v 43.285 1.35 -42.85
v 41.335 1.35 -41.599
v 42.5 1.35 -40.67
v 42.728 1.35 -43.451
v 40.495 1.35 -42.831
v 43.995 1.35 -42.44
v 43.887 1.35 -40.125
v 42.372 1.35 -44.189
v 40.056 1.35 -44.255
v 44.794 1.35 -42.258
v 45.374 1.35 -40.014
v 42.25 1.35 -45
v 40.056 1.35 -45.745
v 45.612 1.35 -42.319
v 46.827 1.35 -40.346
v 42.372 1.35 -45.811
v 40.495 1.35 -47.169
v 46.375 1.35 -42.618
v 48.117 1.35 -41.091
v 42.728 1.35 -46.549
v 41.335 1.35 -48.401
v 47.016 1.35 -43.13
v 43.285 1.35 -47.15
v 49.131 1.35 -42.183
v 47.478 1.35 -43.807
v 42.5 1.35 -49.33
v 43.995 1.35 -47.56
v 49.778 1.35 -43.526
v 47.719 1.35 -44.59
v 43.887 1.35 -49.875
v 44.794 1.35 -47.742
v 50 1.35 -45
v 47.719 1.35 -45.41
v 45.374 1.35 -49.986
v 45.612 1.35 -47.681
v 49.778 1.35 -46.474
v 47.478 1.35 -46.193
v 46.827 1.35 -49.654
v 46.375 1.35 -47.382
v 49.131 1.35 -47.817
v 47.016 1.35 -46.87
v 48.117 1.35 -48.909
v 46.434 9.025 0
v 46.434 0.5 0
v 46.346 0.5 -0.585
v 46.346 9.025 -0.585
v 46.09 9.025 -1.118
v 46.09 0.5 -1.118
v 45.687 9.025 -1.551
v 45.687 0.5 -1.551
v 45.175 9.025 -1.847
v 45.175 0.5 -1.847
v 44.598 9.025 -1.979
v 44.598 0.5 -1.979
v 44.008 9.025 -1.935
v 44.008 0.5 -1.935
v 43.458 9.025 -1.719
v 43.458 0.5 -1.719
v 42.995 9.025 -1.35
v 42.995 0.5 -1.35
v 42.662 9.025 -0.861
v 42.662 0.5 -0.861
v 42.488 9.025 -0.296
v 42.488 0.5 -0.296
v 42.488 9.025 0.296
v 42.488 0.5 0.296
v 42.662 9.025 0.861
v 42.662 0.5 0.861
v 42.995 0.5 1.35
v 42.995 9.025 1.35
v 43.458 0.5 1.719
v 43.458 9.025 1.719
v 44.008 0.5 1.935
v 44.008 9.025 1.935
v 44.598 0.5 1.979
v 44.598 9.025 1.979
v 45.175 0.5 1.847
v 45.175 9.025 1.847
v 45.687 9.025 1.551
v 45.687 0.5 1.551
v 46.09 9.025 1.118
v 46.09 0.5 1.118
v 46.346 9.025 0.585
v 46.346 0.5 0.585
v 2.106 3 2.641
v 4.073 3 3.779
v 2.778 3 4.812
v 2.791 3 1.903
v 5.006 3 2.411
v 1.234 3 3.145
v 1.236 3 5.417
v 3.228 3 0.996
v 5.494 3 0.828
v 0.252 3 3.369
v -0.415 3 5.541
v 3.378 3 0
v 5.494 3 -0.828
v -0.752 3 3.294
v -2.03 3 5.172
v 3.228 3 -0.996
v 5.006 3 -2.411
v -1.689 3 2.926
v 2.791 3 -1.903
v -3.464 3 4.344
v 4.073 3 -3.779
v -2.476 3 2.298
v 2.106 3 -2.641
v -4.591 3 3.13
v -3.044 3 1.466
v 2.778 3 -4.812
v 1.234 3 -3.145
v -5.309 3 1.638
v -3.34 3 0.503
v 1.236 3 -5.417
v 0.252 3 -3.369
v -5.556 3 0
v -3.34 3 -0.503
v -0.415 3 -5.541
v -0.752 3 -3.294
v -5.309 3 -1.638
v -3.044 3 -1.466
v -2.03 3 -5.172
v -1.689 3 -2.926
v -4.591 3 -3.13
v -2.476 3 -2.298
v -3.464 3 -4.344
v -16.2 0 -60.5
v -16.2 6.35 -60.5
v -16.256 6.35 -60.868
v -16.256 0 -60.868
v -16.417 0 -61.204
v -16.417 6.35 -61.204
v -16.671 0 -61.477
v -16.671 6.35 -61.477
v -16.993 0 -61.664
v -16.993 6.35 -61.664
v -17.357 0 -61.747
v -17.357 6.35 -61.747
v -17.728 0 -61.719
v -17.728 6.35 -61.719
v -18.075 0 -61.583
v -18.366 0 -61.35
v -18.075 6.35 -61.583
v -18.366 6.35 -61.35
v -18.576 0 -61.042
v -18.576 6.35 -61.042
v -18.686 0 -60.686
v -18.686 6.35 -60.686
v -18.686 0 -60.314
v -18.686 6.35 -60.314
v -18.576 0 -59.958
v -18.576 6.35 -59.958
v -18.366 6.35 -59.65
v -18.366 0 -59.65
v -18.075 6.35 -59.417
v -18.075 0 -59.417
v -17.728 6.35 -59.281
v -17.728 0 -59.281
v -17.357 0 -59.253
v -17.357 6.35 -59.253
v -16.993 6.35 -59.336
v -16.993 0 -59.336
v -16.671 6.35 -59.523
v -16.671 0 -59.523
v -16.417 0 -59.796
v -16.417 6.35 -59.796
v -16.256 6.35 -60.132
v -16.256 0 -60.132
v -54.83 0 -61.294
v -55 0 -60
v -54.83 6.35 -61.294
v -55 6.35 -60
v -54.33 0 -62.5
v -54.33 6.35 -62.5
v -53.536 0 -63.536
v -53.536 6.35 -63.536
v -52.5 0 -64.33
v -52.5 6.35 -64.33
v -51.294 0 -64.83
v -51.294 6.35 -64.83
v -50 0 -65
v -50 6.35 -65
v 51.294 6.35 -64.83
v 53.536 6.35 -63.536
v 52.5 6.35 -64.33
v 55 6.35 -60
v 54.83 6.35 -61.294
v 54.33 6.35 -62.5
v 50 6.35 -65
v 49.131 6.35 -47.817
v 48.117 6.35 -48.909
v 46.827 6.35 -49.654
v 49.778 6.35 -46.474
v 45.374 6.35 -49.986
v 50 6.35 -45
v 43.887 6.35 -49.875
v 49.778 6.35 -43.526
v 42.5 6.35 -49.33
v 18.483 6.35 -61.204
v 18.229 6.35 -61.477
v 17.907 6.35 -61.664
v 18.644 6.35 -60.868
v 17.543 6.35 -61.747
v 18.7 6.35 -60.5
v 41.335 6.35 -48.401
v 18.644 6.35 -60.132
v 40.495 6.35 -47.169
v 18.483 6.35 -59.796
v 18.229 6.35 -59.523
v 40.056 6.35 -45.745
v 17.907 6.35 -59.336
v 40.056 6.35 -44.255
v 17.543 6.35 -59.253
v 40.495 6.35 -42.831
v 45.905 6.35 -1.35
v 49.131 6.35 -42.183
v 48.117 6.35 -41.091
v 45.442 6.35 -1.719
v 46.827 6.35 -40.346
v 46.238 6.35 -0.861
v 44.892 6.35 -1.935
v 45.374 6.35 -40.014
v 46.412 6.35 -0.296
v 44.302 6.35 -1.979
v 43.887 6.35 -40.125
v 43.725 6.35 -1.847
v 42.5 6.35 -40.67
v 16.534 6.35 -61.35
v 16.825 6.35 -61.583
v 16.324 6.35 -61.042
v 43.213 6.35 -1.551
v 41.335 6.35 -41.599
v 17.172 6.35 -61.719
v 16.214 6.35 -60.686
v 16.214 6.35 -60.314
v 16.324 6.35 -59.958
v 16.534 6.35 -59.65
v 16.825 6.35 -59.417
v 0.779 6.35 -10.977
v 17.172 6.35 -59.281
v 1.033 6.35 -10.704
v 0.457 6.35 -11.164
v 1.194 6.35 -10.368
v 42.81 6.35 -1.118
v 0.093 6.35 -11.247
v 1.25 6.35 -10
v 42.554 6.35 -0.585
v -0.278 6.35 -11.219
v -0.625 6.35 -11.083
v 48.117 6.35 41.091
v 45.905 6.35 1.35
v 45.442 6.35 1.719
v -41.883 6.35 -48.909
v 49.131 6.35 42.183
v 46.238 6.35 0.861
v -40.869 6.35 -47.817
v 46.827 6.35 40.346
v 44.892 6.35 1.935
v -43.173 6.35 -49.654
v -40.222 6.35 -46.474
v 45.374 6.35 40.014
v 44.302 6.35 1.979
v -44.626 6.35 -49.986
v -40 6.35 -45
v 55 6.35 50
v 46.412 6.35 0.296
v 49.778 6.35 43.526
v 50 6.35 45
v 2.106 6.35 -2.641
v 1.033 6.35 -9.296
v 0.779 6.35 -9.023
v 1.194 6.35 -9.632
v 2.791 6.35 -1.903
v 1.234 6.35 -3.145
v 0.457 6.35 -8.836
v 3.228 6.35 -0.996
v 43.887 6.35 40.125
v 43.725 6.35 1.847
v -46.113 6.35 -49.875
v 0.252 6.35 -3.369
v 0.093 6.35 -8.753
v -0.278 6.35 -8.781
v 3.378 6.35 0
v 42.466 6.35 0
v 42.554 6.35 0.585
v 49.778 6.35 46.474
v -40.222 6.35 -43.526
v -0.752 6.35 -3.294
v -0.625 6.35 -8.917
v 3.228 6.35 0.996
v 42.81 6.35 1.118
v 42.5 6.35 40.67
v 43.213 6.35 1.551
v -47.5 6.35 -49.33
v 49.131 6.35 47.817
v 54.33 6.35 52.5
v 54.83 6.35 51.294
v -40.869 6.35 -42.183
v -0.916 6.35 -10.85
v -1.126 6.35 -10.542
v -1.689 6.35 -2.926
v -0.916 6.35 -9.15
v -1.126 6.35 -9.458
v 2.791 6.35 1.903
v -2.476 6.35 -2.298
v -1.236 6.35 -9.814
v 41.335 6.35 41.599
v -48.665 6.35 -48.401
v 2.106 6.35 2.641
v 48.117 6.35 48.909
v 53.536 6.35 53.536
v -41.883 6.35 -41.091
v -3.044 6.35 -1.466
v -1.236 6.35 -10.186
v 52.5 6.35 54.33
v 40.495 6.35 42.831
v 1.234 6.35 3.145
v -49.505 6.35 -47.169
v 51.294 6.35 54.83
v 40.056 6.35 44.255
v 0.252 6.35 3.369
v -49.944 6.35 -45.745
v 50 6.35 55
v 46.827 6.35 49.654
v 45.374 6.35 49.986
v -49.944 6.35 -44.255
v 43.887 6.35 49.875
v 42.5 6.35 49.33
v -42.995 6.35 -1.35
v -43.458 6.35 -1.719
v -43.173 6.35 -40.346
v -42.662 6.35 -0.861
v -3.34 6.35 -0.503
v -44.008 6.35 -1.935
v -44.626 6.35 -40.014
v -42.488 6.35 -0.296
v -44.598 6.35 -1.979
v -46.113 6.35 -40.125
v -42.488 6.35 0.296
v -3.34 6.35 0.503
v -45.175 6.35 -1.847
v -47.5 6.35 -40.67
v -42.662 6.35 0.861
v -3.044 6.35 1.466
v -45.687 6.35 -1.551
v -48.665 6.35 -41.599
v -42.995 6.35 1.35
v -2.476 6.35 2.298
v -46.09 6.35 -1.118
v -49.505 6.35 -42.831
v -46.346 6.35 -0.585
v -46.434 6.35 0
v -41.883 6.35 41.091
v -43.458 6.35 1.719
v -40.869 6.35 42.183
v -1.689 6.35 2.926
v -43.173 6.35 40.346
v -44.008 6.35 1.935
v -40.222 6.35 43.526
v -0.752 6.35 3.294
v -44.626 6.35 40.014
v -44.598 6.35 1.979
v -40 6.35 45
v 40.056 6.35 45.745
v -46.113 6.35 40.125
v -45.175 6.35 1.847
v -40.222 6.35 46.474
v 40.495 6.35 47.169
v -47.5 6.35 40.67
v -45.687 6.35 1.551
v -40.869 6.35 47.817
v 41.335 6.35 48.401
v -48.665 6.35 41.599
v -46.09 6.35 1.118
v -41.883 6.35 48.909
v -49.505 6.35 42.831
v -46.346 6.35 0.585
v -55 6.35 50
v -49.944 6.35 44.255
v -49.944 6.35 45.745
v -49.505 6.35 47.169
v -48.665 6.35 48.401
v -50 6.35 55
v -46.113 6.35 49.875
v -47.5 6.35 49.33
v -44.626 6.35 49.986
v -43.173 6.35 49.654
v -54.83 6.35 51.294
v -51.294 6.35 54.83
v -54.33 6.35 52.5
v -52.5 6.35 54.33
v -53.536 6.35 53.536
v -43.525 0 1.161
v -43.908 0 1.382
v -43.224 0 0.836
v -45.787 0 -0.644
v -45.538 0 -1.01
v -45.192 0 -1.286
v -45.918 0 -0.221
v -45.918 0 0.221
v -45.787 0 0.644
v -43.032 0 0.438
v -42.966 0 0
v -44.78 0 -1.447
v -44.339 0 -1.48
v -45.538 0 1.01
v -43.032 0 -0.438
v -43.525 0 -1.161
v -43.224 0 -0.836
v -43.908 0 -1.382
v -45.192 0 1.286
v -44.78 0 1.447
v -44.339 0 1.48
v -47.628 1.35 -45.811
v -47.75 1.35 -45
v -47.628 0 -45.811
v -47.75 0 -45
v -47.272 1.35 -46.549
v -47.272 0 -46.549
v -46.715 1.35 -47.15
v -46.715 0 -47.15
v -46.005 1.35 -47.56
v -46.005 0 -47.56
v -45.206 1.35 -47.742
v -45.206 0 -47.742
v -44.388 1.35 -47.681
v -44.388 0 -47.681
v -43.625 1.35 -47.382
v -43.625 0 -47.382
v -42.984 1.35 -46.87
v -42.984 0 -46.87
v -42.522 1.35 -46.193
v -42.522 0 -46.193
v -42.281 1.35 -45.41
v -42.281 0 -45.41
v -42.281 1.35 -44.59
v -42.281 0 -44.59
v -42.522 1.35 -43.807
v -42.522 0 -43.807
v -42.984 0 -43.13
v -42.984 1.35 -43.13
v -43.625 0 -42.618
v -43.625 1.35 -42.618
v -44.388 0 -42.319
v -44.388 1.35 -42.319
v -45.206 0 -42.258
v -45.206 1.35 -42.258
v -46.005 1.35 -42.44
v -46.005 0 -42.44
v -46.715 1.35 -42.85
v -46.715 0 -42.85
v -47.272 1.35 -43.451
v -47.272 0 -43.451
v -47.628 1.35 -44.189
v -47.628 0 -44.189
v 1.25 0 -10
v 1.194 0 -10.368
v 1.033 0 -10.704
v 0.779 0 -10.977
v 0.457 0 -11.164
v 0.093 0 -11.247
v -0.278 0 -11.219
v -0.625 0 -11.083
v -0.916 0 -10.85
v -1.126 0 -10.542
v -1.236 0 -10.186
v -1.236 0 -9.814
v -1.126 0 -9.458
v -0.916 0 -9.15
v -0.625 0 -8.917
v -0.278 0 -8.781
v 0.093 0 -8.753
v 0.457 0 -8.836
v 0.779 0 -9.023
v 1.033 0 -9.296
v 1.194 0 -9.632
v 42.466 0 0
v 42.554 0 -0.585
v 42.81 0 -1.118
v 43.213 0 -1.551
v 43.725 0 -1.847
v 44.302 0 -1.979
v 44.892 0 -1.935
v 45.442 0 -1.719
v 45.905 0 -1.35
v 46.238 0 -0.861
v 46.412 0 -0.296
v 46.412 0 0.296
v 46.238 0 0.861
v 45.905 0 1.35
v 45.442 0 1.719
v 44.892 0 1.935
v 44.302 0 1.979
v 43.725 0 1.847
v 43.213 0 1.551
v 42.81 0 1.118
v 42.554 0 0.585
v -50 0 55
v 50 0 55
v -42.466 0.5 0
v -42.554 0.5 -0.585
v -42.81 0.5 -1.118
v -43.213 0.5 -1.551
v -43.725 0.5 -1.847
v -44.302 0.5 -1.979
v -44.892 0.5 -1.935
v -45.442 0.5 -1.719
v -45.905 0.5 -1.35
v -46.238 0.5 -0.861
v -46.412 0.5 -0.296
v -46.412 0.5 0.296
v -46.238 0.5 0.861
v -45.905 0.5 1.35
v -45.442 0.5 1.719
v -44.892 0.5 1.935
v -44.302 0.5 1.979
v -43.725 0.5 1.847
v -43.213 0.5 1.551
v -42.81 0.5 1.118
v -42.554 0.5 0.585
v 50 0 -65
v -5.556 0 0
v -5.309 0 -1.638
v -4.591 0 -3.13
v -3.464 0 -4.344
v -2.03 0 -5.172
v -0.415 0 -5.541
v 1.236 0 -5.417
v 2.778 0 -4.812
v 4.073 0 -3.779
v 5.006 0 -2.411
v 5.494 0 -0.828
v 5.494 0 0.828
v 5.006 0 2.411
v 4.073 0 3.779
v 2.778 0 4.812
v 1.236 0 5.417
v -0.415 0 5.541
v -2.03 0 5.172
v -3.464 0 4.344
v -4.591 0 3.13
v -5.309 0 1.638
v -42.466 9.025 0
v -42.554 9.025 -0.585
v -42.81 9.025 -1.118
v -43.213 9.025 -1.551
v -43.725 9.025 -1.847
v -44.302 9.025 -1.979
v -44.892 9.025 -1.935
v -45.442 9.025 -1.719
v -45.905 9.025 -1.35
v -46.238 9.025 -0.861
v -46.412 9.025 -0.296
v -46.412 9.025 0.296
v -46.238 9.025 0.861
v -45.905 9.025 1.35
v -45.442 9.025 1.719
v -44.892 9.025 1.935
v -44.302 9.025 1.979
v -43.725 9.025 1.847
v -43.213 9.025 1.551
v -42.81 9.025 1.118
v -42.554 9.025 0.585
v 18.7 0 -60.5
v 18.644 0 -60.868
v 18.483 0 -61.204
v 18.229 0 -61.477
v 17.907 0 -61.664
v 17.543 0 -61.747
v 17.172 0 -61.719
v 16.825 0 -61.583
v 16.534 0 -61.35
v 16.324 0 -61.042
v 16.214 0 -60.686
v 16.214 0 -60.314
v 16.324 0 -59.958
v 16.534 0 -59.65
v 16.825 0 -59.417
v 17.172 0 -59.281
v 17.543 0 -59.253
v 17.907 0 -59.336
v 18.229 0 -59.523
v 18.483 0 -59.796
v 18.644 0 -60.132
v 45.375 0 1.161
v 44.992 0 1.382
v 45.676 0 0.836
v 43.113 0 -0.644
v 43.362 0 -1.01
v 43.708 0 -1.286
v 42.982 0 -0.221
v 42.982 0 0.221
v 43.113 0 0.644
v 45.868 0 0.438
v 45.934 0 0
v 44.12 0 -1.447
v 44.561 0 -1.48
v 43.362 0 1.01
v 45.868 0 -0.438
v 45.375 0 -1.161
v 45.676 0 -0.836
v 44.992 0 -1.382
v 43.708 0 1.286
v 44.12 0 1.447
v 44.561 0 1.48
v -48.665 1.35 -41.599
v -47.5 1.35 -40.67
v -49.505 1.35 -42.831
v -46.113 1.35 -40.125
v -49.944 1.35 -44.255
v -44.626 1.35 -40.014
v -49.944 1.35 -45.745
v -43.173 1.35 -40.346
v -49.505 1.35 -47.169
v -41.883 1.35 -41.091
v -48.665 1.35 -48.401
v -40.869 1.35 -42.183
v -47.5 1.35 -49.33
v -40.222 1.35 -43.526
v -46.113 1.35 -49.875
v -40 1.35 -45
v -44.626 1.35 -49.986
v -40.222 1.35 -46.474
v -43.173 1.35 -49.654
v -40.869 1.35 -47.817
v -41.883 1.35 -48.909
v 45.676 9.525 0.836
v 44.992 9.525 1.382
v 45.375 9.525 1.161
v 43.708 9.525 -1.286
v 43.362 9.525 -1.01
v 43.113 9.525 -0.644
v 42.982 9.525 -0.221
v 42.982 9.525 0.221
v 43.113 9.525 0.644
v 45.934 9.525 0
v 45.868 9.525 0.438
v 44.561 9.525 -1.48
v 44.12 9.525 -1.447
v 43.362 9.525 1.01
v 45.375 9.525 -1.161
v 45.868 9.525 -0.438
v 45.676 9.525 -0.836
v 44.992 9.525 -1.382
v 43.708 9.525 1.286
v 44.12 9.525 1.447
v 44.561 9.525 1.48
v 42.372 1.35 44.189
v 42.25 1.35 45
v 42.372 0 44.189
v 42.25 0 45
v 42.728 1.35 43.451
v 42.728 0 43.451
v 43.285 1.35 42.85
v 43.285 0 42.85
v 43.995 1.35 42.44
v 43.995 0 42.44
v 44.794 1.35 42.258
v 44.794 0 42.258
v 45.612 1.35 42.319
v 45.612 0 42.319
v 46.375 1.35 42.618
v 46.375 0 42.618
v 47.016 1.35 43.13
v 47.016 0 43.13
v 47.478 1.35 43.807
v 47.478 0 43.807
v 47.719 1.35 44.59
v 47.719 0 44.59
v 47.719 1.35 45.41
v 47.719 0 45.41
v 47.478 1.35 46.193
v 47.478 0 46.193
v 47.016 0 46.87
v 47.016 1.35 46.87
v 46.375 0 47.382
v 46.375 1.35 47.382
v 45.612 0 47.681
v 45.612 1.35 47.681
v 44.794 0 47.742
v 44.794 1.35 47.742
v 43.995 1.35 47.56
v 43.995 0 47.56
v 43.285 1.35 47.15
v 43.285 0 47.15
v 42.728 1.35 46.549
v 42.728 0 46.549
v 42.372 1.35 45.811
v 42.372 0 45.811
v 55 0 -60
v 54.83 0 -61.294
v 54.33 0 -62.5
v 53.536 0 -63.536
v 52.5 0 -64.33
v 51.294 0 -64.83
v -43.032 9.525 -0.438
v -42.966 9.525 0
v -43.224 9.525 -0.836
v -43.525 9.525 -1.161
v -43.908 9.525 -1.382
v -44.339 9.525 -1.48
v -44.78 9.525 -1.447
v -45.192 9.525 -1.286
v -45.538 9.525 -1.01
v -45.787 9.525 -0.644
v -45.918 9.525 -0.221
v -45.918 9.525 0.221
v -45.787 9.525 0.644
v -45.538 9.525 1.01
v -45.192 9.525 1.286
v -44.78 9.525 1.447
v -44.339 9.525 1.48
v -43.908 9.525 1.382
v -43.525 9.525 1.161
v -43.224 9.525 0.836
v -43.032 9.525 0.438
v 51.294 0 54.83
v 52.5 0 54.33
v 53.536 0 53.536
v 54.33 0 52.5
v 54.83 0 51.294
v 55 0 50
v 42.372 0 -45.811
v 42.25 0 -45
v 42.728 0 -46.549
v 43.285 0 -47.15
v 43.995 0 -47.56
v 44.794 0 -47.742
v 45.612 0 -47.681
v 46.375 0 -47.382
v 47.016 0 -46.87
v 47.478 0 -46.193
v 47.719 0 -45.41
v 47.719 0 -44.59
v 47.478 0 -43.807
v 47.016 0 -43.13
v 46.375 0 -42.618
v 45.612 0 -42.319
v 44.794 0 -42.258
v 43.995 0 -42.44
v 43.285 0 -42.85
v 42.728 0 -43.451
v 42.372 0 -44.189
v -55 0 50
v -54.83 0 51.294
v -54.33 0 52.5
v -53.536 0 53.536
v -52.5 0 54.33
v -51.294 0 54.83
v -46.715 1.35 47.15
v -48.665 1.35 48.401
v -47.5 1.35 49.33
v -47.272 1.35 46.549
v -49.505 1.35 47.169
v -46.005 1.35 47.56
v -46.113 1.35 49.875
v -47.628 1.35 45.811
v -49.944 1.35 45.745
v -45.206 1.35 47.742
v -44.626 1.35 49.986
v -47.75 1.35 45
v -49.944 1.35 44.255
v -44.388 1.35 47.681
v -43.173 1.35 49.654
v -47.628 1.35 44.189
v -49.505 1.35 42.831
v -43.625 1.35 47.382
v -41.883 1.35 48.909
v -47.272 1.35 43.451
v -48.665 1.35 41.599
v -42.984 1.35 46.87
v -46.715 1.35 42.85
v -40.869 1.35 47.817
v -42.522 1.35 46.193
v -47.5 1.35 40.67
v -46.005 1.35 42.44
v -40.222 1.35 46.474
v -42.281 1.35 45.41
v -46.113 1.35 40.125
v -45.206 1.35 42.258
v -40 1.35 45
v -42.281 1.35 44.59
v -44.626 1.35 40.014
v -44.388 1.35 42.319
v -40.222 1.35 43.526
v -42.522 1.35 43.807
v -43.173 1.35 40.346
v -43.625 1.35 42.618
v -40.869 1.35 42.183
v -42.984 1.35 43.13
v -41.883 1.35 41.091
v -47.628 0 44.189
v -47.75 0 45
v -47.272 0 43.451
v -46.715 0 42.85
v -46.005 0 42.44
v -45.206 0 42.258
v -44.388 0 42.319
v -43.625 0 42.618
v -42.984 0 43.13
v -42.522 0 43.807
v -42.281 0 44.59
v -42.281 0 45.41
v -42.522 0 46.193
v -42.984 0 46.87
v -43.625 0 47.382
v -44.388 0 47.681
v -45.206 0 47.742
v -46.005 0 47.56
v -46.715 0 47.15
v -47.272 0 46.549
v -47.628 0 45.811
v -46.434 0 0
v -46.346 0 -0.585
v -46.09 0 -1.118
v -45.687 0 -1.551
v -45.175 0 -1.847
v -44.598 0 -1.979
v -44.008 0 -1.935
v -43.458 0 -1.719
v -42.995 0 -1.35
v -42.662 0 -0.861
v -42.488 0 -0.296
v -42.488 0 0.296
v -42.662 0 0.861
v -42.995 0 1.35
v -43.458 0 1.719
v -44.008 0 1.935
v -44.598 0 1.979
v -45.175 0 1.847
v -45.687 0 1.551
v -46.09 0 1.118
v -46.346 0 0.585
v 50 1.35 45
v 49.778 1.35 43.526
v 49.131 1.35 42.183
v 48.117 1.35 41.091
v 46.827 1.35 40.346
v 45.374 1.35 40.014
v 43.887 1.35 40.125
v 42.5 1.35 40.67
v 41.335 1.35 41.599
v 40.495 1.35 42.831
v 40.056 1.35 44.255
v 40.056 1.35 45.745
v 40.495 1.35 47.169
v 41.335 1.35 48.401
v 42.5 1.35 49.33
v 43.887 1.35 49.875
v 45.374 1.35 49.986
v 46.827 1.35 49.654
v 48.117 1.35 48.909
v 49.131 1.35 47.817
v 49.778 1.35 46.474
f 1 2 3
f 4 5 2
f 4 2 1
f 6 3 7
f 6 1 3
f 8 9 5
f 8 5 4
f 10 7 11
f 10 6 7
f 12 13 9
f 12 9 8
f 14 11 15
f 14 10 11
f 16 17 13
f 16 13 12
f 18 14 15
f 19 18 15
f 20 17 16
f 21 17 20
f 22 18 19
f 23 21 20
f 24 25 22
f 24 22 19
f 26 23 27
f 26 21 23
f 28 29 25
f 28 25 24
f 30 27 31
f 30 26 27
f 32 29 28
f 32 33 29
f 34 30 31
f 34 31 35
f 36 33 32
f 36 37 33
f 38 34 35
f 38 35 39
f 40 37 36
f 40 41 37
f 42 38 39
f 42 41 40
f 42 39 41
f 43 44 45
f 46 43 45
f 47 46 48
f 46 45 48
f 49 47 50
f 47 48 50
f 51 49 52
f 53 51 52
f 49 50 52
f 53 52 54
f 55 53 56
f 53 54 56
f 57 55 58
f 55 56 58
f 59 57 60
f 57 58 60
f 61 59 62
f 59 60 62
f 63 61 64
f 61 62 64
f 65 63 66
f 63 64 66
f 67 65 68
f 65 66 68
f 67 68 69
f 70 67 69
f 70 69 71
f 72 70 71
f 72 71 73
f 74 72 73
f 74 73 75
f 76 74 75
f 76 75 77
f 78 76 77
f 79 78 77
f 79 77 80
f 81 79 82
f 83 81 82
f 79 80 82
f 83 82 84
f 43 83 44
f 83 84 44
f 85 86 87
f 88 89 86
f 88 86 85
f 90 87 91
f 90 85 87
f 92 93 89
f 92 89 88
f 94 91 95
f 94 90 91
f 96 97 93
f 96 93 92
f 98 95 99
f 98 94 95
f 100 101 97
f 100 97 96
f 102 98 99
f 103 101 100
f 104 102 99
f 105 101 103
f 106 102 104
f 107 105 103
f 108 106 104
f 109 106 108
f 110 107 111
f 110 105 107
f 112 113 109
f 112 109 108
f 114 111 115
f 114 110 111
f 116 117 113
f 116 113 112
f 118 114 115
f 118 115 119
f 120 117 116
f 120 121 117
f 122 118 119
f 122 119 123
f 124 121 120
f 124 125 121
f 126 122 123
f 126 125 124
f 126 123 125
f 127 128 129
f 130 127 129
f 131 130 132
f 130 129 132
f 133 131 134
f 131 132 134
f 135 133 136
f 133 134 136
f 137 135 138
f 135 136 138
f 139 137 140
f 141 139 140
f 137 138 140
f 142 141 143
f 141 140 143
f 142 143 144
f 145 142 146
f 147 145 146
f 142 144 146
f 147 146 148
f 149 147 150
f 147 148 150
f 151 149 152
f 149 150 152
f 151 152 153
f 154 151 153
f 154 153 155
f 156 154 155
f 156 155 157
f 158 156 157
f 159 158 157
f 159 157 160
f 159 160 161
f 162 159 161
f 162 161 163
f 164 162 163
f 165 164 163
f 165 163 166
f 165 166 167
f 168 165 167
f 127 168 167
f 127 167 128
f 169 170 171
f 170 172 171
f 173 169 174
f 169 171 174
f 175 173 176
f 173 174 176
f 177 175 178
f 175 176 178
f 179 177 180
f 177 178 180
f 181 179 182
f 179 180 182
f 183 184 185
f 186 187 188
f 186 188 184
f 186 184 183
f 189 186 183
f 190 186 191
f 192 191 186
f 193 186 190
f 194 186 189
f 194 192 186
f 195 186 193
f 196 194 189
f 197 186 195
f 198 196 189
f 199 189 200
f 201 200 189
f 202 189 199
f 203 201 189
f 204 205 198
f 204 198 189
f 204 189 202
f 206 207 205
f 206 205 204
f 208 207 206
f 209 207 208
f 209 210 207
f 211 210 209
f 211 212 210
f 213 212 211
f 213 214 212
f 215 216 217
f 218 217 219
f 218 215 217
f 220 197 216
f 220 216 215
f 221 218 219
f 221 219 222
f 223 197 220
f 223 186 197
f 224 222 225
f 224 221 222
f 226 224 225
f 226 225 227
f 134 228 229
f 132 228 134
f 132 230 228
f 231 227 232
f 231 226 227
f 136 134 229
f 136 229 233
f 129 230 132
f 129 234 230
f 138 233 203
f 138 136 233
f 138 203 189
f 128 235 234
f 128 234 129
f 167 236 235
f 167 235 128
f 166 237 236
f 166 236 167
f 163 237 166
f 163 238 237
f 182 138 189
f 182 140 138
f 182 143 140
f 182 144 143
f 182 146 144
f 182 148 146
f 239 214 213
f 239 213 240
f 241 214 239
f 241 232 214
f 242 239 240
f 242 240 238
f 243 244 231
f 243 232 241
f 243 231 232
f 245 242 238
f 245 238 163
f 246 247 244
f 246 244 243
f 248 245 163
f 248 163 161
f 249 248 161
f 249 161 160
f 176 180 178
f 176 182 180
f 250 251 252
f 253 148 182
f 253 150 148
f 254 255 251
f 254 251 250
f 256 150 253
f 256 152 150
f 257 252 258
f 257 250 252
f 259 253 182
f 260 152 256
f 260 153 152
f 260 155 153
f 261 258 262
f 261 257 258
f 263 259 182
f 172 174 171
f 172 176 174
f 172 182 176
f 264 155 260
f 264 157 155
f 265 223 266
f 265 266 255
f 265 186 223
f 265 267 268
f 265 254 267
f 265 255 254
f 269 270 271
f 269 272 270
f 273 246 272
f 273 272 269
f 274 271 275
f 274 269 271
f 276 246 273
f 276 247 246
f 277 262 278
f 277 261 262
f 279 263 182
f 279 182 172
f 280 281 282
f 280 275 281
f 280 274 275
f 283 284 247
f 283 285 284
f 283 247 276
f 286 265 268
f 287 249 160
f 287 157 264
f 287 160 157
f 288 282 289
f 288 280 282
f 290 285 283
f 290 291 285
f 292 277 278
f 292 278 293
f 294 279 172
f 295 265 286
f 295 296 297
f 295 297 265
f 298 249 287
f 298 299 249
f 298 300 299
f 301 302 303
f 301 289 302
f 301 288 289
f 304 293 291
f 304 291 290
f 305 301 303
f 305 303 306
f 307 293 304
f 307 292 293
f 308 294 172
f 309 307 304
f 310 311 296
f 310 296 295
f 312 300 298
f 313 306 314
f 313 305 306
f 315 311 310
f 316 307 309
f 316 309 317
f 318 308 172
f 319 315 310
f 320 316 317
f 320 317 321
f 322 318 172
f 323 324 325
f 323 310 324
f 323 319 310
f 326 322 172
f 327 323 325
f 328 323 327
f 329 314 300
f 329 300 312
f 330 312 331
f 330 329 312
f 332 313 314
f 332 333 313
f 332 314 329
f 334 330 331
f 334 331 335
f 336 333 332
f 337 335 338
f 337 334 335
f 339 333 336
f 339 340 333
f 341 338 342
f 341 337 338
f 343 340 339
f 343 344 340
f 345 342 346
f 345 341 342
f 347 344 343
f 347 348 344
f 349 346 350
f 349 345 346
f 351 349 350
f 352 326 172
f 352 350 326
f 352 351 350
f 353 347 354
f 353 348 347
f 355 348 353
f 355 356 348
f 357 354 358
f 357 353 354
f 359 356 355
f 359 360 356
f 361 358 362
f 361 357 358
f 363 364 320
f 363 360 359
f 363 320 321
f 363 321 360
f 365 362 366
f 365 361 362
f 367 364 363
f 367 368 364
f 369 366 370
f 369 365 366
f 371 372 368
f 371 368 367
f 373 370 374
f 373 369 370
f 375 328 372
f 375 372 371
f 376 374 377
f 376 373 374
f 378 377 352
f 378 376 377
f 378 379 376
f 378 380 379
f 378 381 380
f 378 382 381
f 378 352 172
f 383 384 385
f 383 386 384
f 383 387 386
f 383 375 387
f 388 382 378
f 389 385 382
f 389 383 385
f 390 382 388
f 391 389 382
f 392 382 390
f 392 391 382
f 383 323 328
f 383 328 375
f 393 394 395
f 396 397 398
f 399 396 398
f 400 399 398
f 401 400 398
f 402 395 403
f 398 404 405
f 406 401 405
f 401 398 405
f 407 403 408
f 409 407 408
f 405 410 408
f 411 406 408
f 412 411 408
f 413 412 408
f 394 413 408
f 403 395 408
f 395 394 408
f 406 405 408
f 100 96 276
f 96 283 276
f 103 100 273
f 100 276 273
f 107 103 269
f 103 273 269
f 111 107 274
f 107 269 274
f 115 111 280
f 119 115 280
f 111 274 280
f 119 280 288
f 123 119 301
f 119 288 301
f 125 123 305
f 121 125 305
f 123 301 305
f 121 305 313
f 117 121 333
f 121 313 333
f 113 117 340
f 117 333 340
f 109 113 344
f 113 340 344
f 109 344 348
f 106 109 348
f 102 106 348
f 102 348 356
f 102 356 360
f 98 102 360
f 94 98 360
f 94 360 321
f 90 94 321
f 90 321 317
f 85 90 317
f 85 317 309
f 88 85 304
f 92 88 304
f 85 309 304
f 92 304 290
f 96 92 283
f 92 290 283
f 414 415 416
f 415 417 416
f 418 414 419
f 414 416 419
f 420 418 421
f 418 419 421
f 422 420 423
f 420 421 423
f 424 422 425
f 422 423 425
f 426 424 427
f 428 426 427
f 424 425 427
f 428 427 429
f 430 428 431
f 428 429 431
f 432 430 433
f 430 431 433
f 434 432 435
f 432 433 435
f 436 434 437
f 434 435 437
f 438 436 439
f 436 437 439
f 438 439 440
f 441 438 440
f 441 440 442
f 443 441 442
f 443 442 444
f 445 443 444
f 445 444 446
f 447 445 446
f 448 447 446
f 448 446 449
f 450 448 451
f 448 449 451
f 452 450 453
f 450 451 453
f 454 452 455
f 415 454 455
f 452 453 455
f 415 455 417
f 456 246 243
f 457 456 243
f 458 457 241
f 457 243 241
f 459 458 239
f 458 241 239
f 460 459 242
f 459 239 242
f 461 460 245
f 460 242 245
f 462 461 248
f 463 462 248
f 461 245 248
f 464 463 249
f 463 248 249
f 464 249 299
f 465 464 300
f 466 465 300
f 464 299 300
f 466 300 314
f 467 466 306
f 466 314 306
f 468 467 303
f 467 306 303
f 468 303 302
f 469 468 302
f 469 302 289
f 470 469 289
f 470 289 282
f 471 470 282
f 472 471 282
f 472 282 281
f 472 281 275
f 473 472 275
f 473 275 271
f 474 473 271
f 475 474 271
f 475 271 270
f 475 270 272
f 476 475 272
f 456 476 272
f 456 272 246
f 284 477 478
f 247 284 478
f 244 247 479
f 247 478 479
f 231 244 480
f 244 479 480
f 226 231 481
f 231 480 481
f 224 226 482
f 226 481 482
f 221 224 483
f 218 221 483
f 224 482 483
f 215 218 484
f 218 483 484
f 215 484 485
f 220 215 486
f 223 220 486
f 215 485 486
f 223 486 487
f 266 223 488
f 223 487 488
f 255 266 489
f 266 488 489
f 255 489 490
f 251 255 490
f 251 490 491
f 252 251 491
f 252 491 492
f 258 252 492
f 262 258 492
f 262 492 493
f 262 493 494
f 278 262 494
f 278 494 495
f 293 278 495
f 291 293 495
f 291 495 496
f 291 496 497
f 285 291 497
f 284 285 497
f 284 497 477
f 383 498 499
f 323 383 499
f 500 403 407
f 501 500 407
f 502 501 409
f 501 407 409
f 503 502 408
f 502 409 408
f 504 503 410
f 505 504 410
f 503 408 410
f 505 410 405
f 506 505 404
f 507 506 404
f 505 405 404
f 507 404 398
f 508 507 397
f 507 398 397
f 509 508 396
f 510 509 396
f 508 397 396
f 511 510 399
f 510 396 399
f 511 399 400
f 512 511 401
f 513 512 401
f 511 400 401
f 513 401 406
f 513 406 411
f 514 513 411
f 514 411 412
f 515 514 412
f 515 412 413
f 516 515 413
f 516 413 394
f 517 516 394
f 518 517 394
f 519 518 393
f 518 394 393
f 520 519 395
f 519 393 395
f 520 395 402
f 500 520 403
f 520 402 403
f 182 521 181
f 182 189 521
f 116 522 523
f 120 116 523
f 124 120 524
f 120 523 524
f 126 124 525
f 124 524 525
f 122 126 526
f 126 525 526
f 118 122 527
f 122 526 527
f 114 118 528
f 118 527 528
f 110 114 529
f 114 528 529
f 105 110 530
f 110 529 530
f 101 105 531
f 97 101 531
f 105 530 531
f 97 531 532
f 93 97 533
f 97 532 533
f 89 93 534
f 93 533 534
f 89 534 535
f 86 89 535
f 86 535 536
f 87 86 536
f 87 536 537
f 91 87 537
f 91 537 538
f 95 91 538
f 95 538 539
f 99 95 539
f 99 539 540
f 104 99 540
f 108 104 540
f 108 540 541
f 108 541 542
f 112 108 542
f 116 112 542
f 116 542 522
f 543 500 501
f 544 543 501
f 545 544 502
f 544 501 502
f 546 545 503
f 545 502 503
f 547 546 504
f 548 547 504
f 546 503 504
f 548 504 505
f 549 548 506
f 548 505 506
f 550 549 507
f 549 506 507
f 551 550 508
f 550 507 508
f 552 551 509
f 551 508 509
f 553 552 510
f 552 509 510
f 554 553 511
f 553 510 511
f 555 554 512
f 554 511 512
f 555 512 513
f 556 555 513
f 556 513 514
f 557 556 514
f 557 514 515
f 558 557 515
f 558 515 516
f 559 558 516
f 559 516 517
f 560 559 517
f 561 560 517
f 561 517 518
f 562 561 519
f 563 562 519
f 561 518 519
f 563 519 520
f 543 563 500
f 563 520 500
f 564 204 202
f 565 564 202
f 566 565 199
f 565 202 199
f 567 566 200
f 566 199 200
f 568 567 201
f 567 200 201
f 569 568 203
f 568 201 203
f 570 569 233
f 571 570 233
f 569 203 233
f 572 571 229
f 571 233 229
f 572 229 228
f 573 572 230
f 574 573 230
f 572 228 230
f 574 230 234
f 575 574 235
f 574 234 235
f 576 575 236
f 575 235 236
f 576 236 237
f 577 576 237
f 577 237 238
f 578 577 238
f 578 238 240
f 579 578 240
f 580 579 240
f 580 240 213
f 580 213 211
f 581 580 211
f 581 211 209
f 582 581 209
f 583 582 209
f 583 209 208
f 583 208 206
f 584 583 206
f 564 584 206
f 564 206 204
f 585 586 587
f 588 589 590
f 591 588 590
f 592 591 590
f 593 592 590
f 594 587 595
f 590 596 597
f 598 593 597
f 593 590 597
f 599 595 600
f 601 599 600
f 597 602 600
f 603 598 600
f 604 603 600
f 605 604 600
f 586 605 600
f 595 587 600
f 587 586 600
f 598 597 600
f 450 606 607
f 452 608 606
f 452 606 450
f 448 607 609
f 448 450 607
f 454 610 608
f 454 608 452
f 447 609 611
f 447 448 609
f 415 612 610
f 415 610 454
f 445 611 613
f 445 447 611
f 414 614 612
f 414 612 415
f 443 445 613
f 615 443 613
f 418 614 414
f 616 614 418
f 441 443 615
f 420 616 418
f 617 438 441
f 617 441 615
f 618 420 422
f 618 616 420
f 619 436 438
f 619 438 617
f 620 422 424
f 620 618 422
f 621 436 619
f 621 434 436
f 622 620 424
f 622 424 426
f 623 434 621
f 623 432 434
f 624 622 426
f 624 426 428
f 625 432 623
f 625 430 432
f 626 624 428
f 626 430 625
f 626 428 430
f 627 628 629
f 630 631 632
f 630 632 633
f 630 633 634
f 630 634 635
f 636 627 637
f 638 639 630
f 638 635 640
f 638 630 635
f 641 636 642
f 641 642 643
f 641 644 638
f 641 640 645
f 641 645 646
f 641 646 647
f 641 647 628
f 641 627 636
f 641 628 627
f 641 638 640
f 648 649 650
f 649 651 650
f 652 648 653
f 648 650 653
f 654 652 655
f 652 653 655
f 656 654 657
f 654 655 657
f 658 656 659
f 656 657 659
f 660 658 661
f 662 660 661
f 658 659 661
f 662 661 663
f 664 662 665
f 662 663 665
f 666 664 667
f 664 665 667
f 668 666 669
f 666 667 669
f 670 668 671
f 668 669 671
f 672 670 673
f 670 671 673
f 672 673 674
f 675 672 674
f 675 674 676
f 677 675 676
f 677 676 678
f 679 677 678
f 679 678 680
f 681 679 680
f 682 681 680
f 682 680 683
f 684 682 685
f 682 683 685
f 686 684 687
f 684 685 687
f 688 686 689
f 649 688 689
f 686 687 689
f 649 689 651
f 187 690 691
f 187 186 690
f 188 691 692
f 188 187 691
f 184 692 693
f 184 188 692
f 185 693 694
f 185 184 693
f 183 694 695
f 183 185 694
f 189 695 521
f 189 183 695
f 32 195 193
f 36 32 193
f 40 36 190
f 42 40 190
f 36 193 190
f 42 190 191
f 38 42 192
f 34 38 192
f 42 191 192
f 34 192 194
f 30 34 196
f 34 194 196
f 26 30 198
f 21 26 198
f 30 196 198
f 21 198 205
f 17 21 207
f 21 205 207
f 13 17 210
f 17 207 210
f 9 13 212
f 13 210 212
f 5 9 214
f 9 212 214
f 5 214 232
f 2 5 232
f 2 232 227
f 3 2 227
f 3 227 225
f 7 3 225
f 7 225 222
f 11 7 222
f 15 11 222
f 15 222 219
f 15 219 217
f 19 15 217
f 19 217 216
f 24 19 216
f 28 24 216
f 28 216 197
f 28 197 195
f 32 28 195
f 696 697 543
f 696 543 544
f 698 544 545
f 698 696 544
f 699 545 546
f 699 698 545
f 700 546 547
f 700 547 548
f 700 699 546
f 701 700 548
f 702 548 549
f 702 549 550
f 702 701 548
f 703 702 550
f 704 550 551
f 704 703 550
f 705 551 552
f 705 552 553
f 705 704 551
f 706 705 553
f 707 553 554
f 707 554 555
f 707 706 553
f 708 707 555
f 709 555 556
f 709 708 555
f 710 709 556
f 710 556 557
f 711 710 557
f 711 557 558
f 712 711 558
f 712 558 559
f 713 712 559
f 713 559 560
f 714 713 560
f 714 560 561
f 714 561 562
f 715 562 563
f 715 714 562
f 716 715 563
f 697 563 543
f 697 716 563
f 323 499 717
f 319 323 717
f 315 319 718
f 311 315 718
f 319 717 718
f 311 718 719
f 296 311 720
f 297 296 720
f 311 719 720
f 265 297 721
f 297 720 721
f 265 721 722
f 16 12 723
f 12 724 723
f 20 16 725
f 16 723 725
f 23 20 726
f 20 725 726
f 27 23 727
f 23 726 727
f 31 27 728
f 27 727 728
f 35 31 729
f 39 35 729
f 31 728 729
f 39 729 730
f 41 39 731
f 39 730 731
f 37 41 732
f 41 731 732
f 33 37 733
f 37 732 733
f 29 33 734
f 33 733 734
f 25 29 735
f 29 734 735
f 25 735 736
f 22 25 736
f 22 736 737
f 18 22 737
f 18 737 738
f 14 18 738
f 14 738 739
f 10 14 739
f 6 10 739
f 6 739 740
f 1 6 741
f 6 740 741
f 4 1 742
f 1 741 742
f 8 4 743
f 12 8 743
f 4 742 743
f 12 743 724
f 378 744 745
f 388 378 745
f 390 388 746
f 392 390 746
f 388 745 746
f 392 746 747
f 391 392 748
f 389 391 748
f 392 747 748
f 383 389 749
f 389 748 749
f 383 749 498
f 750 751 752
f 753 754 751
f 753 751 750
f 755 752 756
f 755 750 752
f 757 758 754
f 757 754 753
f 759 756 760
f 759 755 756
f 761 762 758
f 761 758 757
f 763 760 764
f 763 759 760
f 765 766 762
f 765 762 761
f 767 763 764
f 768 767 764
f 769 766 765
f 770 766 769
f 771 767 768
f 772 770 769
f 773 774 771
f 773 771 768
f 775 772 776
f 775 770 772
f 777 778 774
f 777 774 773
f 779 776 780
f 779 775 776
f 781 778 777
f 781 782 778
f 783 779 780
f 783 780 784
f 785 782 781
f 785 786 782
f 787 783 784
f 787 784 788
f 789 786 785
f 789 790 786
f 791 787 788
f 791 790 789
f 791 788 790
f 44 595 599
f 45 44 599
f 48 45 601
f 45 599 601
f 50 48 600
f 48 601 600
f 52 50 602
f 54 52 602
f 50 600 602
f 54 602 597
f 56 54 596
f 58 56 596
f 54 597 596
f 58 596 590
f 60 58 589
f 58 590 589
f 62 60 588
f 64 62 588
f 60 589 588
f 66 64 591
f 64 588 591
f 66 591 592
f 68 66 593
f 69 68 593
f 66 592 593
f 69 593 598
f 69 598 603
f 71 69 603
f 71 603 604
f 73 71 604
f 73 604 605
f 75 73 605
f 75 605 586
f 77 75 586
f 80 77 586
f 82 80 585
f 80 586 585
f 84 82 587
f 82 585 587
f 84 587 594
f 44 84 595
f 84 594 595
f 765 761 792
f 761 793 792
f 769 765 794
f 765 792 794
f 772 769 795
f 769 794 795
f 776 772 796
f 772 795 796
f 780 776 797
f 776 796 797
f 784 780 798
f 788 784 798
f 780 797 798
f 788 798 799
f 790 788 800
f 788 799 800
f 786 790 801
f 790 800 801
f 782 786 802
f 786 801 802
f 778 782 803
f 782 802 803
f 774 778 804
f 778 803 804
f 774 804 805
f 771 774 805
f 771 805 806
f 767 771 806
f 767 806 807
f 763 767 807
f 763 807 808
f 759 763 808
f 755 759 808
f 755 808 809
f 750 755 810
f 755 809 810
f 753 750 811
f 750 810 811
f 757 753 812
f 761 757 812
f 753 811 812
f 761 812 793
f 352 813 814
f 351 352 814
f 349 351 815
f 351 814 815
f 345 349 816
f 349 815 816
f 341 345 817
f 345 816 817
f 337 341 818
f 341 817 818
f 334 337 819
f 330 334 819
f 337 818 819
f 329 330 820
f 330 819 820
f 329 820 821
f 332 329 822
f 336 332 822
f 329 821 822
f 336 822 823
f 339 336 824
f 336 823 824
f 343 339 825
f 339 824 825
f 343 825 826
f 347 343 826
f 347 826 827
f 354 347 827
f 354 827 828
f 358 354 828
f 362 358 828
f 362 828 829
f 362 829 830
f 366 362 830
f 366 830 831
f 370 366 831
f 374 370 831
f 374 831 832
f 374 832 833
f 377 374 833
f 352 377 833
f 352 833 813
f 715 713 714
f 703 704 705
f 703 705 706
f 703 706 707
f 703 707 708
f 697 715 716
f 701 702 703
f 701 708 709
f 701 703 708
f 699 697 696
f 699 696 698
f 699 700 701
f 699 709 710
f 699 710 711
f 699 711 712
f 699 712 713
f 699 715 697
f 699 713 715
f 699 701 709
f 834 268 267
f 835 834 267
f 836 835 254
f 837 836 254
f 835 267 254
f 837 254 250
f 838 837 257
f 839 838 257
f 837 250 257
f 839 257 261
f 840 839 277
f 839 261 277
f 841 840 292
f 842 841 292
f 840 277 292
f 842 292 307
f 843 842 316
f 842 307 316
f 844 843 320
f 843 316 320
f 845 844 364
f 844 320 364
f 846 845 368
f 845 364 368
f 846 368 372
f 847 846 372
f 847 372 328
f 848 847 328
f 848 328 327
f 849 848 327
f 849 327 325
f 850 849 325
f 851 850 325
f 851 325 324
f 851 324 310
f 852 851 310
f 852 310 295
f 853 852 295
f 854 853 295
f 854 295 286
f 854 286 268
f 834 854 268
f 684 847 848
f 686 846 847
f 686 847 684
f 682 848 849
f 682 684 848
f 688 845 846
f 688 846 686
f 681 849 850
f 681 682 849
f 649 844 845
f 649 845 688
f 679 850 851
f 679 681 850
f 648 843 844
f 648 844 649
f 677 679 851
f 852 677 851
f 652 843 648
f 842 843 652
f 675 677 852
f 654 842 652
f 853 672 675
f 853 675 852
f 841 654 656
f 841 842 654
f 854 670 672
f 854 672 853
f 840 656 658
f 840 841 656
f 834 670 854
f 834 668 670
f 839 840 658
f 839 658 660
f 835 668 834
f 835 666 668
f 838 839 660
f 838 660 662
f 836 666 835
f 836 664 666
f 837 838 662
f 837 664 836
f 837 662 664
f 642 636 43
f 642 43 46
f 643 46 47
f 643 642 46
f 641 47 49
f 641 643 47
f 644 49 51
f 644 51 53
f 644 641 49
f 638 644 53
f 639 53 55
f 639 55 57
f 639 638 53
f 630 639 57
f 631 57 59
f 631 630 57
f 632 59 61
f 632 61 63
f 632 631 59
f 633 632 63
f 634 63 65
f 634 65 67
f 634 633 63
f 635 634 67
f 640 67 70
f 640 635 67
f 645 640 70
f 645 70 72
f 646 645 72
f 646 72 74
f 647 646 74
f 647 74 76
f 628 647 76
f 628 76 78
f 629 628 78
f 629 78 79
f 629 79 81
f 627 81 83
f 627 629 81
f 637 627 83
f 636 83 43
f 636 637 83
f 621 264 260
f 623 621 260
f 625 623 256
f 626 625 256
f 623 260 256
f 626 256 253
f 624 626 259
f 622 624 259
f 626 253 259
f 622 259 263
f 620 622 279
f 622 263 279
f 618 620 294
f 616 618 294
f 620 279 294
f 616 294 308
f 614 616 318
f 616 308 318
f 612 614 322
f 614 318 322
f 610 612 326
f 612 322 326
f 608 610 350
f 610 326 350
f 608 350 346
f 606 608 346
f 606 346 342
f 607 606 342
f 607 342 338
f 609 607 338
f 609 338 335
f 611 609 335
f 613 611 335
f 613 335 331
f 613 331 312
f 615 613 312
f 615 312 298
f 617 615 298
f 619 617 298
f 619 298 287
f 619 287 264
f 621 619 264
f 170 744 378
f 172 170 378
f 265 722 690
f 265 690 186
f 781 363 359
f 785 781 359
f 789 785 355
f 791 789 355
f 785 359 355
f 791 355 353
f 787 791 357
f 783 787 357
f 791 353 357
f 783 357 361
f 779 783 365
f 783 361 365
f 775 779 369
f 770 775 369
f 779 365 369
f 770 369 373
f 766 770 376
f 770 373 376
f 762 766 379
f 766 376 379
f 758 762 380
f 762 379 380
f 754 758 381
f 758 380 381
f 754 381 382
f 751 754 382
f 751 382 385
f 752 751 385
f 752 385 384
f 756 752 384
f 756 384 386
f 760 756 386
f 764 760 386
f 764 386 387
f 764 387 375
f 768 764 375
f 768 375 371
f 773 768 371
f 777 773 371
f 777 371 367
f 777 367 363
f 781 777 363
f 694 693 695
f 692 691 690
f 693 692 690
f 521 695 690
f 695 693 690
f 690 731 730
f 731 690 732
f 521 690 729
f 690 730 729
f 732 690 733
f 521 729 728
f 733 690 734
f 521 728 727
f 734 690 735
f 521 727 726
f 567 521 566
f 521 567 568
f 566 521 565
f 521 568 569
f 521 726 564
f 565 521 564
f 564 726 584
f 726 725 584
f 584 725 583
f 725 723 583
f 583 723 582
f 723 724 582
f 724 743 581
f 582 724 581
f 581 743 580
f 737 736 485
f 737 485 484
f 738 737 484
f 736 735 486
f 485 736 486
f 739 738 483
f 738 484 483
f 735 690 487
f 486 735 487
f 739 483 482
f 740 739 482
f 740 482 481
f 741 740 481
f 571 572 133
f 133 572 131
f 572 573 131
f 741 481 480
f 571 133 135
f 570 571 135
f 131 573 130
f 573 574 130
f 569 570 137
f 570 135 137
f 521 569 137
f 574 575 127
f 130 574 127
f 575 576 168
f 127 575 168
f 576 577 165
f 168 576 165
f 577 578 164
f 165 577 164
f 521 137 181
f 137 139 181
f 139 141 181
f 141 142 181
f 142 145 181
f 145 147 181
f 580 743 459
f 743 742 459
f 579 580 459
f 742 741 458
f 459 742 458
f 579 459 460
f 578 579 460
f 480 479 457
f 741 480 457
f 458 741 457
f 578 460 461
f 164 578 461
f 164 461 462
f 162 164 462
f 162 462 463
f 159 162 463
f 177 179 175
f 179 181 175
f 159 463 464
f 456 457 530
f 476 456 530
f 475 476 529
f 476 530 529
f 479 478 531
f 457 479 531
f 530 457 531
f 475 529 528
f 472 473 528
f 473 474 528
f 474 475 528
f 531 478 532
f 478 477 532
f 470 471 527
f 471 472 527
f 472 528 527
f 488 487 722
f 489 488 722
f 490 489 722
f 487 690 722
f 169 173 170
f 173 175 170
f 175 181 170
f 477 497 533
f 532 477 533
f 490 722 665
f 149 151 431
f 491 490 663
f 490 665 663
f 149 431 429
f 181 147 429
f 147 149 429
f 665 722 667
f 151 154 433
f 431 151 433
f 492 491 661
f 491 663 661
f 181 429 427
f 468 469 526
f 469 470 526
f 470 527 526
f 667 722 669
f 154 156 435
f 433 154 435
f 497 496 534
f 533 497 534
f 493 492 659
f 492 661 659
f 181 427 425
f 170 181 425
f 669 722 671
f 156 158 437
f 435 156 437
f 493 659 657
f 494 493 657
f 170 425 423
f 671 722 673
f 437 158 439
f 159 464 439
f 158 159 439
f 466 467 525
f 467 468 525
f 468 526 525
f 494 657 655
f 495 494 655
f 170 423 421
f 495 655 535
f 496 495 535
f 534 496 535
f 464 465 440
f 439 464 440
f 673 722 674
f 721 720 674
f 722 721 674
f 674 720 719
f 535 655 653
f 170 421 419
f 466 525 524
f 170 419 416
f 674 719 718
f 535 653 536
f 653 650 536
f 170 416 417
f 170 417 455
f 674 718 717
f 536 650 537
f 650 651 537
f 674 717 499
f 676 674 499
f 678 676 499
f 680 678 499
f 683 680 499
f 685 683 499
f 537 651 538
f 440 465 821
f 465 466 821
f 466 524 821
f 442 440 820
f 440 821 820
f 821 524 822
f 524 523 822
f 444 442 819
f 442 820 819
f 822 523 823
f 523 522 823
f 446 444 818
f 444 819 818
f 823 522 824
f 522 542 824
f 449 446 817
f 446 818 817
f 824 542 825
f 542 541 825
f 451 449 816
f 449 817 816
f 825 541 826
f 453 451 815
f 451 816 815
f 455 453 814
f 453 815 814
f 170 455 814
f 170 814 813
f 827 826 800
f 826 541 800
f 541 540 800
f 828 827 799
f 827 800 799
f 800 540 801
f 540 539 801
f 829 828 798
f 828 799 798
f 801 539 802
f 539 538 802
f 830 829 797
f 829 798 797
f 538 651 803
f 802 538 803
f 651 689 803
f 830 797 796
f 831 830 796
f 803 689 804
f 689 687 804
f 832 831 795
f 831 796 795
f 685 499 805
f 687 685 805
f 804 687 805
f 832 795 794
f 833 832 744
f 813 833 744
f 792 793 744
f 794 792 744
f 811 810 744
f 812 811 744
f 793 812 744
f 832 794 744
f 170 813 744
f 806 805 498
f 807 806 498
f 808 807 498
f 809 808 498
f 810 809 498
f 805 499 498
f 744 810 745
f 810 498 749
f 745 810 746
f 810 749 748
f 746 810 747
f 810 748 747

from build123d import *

# Parameters (mm, degrees)
BOSS_EXTRUDE1_DEPTH                              = 6.35
CBORE_FOR_1_4_SOCKET_HEAD_CAP_SCREW1_D           = 6.7564
CBORE_FOR_1_4_SOCKET_HEAD_CAP_SCREW1_CBORE_D     = 11.1125
CBORE_FOR_1_4_SOCKET_HEAD_CAP_SCREW1_CBORE_DEPTH = 2.999994
CBORE_FOR_M5_SHCS1_D                             = 5.5
CBORE_FOR_M5_SHCS1_DEPTH                         = 11.59
CBORE_FOR_M5_SHCS1_CBORE_D                       = 10
CBORE_FOR_M5_SHCS1_CBORE_DEPTH                   = 5
CBORE_FOR_M5_SHCS1_TIP                           = 1.652366702
F_1_8_0_125_PRESS_DOWEL_HOLE1_D                  = 3.96875
SKETCH12_W                                       = 110
SKETCH12_H                                       = 6.35
BOSS_EXTRUDE3_DEPTH                              = 10
FILLET1_R                                        = 5
M3X0_5_TAPPED_HOLE1_D                            = 2.5
SKETCH13_R                                       = 1.984375
BOSS_EXTRUDE4_DEPTH                              = 9.525
BOSS_EXTRUDE4_2_DEPTH                            = 9.525
CHAMFER1_SIZE                                    = 0.5
CHAMFER2_SIZE                                    = 0.5


with BuildPart() as part:
    # Sketch1 → Boss-Extrude1 (new body)
    with BuildSketch(Plane(origin=(0, 0, 0), x_dir=(1, 0, 0), z_dir=(0, 1, 0))):
        with BuildLine():
            Line((-50, -55), (50, -55))
            ThreePointArc((50, -55), (53.535533906, -53.535533906), (55, -50))
            Line((55, -50), (55, 55))
            Line((55, 55), (-55, 55))
            Line((-55, 55), (-55, -50))
            ThreePointArc((-55, -50), (-53.535533906, -53.535533906), (-50, -55))
        make_face()
    extrude(amount=BOSS_EXTRUDE1_DEPTH)

    # CBORE for 1/4 Socket Head Cap Screw1 (through all)
    with Locations(Plane(origin=(0, 0, 0), x_dir=(-1, 0, 0), z_dir=(0, -1, 0))):
        with Locations((0, 0)):
            CounterBoreHole(CBORE_FOR_1_4_SOCKET_HEAD_CAP_SCREW1_D / 2, CBORE_FOR_1_4_SOCKET_HEAD_CAP_SCREW1_CBORE_D / 2, CBORE_FOR_1_4_SOCKET_HEAD_CAP_SCREW1_CBORE_DEPTH)

    # CBORE for M5 SHCS1
    with Locations(Plane(origin=(0, 6.35, 0), x_dir=(1, 0, 0), z_dir=(0, 1, 0))):
        with Locations((45, 45), (45, -45), (-45, -45), (-45, 45)):
            CounterBoreHole(CBORE_FOR_M5_SHCS1_D / 2, CBORE_FOR_M5_SHCS1_CBORE_D / 2, CBORE_FOR_M5_SHCS1_CBORE_DEPTH, depth=CBORE_FOR_M5_SHCS1_DEPTH)
            with Locations((0, 0, -(CBORE_FOR_M5_SHCS1_DEPTH + CBORE_FOR_M5_SHCS1_TIP / 2))):  # 118° drill point
                Cone(0, CBORE_FOR_M5_SHCS1_D / 2, CBORE_FOR_M5_SHCS1_TIP, mode=Mode.SUBTRACT)

    # 1/8 (0.125) Press Dowel Hole1 (through all)
    with Locations(Plane(origin=(0, 6.35, 0), x_dir=(1, 0, 0), z_dir=(0, 1, 0))):
        with Locations((-44.45, 0), (44.45, 0)):
            Hole(F_1_8_0_125_PRESS_DOWEL_HOLE1_D / 2)

    # Sketch12 → Boss-Extrude3 (add)
    with BuildSketch(Plane(origin=(0, 0, -55), x_dir=(-1, 0, 0), z_dir=(0, 0, -1))):
        with Locations((0, 3.175)):
            Rectangle(SKETCH12_W, SKETCH12_H)
    extrude(amount=BOSS_EXTRUDE3_DEPTH)

    # Fillet1
    fillet1_edges = [part.edges().sort_by_distance(p)[0] for p in [
        (55, 3.175, -65),
        (-55, 3.175, -65),
    ]]
    fillet(fillet1_edges, radius=FILLET1_R)

    # M3x0.5 Tapped Hole1 (through all)
    with Locations(Plane(origin=(0, 0, 0), x_dir=(-1, 0, 0), z_dir=(0, -1, 0))):
        with Locations((-17.45, 60.5), (17.45, 60.5), (0, 10)):
            Hole(M3X0_5_TAPPED_HOLE1_D / 2)


with BuildPart() as body_2:
    # Sketch13 → Boss-Extrude4 (new body)
    with BuildSketch(Plane(origin=(0, 0, 0), x_dir=(1, 0, 0), z_dir=(0, 1, 0))):
        with Locations((44.45, 0)):
            Circle(SKETCH13_R)
    extrude(amount=BOSS_EXTRUDE4_DEPTH)

    # Chamfer1
    chamfer1_edges = [body_2.edges().sort_by_distance(p)[0] for p in [
        (42.465625, 0, 0),
        (42.465625, 9.525, 0),
    ]]
    chamfer(chamfer1_edges, length=CHAMFER1_SIZE)


with BuildPart() as body_3:
    # Sketch13 → Boss-Extrude4 2 (new body)
    with BuildSketch(Plane(origin=(0, 0, 0), x_dir=(1, 0, 0), z_dir=(0, 1, 0))):
        with Locations((-44.45, 0)):
            Circle(SKETCH13_R)
    extrude(amount=BOSS_EXTRUDE4_2_DEPTH)

    # Chamfer2
    chamfer2_edges = [body_3.edges().sort_by_distance(p)[0] for p in [
        (-46.434375, 0, 0),
        (-46.434375, 9.525, 0),
    ]]
    chamfer(chamfer2_edges, length=CHAMFER2_SIZE)


solid = Compound([part.part, body_2.part, body_3.part])
